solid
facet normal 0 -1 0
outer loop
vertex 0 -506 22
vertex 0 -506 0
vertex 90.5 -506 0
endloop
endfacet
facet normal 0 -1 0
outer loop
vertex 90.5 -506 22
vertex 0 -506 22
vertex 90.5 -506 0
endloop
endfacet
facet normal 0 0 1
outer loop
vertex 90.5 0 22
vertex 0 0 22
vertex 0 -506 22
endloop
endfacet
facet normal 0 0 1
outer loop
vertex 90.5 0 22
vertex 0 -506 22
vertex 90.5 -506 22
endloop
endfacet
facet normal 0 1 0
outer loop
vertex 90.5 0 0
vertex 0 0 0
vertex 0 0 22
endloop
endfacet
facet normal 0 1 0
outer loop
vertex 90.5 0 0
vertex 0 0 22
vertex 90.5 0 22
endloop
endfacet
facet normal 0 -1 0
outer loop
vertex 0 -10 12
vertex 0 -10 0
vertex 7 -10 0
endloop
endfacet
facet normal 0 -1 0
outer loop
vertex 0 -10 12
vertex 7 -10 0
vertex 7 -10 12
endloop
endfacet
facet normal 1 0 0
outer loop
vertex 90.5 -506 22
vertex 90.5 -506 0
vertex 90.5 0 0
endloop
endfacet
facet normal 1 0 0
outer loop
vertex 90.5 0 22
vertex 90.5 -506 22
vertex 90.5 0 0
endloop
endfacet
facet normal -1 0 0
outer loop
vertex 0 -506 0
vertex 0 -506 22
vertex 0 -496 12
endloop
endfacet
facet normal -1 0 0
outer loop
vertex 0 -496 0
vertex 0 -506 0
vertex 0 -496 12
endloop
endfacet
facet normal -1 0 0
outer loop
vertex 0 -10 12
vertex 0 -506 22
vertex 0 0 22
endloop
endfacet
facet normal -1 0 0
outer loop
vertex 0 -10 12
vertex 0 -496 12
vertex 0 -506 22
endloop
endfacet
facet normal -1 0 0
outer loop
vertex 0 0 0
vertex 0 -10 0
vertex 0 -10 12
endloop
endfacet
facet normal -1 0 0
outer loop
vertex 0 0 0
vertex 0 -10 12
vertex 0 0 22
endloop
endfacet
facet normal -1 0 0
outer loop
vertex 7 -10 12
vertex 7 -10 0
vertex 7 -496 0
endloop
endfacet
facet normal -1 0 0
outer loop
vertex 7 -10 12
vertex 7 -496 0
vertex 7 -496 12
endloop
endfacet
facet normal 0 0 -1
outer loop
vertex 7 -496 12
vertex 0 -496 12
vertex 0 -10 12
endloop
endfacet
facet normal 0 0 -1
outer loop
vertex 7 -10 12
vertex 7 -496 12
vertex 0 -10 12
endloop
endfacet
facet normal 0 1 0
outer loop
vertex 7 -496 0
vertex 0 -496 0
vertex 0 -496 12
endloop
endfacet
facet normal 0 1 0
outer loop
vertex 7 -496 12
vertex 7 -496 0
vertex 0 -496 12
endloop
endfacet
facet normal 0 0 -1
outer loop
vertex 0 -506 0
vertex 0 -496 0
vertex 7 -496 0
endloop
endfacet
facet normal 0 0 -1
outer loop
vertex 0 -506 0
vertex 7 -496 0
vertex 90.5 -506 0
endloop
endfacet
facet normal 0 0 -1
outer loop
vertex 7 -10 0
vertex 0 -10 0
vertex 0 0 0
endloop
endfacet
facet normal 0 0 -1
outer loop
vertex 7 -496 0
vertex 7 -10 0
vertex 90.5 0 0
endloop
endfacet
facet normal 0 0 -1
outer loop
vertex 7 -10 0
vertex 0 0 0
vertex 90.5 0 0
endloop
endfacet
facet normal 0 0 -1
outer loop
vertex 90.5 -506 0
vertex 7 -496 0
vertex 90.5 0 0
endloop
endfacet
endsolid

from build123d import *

# Parameters (mm, degrees)
ESQUISSE1_W             = 90.5
ESQUISSE1_H             = 506
BOSS_EXTRU_1_DEPTH      = 22
ESQUISSE2_W             = 12
ESQUISSE2_H             = 486
ENL_V_MAT_EXTRU_1_DEPTH = 7


with BuildPart() as part:
    # Esquisse1 → Boss.-Extru.1 (new body)
    with BuildSketch(Plane.XY):
        with Locations((45.25, -253)):
            Rectangle(ESQUISSE1_W, ESQUISSE1_H)
    extrude(amount=BOSS_EXTRU_1_DEPTH)

    # Esquisse2 → Enlèv. mat.-Extru.1 (cut)
    with BuildSketch(Plane.ZY):
        with Locations((6, -253)):
            Rectangle(ESQUISSE2_W, ESQUISSE2_H)
    extrude(amount=-ENL_V_MAT_EXTRU_1_DEPTH, mode=Mode.SUBTRACT)


solid = part.part
